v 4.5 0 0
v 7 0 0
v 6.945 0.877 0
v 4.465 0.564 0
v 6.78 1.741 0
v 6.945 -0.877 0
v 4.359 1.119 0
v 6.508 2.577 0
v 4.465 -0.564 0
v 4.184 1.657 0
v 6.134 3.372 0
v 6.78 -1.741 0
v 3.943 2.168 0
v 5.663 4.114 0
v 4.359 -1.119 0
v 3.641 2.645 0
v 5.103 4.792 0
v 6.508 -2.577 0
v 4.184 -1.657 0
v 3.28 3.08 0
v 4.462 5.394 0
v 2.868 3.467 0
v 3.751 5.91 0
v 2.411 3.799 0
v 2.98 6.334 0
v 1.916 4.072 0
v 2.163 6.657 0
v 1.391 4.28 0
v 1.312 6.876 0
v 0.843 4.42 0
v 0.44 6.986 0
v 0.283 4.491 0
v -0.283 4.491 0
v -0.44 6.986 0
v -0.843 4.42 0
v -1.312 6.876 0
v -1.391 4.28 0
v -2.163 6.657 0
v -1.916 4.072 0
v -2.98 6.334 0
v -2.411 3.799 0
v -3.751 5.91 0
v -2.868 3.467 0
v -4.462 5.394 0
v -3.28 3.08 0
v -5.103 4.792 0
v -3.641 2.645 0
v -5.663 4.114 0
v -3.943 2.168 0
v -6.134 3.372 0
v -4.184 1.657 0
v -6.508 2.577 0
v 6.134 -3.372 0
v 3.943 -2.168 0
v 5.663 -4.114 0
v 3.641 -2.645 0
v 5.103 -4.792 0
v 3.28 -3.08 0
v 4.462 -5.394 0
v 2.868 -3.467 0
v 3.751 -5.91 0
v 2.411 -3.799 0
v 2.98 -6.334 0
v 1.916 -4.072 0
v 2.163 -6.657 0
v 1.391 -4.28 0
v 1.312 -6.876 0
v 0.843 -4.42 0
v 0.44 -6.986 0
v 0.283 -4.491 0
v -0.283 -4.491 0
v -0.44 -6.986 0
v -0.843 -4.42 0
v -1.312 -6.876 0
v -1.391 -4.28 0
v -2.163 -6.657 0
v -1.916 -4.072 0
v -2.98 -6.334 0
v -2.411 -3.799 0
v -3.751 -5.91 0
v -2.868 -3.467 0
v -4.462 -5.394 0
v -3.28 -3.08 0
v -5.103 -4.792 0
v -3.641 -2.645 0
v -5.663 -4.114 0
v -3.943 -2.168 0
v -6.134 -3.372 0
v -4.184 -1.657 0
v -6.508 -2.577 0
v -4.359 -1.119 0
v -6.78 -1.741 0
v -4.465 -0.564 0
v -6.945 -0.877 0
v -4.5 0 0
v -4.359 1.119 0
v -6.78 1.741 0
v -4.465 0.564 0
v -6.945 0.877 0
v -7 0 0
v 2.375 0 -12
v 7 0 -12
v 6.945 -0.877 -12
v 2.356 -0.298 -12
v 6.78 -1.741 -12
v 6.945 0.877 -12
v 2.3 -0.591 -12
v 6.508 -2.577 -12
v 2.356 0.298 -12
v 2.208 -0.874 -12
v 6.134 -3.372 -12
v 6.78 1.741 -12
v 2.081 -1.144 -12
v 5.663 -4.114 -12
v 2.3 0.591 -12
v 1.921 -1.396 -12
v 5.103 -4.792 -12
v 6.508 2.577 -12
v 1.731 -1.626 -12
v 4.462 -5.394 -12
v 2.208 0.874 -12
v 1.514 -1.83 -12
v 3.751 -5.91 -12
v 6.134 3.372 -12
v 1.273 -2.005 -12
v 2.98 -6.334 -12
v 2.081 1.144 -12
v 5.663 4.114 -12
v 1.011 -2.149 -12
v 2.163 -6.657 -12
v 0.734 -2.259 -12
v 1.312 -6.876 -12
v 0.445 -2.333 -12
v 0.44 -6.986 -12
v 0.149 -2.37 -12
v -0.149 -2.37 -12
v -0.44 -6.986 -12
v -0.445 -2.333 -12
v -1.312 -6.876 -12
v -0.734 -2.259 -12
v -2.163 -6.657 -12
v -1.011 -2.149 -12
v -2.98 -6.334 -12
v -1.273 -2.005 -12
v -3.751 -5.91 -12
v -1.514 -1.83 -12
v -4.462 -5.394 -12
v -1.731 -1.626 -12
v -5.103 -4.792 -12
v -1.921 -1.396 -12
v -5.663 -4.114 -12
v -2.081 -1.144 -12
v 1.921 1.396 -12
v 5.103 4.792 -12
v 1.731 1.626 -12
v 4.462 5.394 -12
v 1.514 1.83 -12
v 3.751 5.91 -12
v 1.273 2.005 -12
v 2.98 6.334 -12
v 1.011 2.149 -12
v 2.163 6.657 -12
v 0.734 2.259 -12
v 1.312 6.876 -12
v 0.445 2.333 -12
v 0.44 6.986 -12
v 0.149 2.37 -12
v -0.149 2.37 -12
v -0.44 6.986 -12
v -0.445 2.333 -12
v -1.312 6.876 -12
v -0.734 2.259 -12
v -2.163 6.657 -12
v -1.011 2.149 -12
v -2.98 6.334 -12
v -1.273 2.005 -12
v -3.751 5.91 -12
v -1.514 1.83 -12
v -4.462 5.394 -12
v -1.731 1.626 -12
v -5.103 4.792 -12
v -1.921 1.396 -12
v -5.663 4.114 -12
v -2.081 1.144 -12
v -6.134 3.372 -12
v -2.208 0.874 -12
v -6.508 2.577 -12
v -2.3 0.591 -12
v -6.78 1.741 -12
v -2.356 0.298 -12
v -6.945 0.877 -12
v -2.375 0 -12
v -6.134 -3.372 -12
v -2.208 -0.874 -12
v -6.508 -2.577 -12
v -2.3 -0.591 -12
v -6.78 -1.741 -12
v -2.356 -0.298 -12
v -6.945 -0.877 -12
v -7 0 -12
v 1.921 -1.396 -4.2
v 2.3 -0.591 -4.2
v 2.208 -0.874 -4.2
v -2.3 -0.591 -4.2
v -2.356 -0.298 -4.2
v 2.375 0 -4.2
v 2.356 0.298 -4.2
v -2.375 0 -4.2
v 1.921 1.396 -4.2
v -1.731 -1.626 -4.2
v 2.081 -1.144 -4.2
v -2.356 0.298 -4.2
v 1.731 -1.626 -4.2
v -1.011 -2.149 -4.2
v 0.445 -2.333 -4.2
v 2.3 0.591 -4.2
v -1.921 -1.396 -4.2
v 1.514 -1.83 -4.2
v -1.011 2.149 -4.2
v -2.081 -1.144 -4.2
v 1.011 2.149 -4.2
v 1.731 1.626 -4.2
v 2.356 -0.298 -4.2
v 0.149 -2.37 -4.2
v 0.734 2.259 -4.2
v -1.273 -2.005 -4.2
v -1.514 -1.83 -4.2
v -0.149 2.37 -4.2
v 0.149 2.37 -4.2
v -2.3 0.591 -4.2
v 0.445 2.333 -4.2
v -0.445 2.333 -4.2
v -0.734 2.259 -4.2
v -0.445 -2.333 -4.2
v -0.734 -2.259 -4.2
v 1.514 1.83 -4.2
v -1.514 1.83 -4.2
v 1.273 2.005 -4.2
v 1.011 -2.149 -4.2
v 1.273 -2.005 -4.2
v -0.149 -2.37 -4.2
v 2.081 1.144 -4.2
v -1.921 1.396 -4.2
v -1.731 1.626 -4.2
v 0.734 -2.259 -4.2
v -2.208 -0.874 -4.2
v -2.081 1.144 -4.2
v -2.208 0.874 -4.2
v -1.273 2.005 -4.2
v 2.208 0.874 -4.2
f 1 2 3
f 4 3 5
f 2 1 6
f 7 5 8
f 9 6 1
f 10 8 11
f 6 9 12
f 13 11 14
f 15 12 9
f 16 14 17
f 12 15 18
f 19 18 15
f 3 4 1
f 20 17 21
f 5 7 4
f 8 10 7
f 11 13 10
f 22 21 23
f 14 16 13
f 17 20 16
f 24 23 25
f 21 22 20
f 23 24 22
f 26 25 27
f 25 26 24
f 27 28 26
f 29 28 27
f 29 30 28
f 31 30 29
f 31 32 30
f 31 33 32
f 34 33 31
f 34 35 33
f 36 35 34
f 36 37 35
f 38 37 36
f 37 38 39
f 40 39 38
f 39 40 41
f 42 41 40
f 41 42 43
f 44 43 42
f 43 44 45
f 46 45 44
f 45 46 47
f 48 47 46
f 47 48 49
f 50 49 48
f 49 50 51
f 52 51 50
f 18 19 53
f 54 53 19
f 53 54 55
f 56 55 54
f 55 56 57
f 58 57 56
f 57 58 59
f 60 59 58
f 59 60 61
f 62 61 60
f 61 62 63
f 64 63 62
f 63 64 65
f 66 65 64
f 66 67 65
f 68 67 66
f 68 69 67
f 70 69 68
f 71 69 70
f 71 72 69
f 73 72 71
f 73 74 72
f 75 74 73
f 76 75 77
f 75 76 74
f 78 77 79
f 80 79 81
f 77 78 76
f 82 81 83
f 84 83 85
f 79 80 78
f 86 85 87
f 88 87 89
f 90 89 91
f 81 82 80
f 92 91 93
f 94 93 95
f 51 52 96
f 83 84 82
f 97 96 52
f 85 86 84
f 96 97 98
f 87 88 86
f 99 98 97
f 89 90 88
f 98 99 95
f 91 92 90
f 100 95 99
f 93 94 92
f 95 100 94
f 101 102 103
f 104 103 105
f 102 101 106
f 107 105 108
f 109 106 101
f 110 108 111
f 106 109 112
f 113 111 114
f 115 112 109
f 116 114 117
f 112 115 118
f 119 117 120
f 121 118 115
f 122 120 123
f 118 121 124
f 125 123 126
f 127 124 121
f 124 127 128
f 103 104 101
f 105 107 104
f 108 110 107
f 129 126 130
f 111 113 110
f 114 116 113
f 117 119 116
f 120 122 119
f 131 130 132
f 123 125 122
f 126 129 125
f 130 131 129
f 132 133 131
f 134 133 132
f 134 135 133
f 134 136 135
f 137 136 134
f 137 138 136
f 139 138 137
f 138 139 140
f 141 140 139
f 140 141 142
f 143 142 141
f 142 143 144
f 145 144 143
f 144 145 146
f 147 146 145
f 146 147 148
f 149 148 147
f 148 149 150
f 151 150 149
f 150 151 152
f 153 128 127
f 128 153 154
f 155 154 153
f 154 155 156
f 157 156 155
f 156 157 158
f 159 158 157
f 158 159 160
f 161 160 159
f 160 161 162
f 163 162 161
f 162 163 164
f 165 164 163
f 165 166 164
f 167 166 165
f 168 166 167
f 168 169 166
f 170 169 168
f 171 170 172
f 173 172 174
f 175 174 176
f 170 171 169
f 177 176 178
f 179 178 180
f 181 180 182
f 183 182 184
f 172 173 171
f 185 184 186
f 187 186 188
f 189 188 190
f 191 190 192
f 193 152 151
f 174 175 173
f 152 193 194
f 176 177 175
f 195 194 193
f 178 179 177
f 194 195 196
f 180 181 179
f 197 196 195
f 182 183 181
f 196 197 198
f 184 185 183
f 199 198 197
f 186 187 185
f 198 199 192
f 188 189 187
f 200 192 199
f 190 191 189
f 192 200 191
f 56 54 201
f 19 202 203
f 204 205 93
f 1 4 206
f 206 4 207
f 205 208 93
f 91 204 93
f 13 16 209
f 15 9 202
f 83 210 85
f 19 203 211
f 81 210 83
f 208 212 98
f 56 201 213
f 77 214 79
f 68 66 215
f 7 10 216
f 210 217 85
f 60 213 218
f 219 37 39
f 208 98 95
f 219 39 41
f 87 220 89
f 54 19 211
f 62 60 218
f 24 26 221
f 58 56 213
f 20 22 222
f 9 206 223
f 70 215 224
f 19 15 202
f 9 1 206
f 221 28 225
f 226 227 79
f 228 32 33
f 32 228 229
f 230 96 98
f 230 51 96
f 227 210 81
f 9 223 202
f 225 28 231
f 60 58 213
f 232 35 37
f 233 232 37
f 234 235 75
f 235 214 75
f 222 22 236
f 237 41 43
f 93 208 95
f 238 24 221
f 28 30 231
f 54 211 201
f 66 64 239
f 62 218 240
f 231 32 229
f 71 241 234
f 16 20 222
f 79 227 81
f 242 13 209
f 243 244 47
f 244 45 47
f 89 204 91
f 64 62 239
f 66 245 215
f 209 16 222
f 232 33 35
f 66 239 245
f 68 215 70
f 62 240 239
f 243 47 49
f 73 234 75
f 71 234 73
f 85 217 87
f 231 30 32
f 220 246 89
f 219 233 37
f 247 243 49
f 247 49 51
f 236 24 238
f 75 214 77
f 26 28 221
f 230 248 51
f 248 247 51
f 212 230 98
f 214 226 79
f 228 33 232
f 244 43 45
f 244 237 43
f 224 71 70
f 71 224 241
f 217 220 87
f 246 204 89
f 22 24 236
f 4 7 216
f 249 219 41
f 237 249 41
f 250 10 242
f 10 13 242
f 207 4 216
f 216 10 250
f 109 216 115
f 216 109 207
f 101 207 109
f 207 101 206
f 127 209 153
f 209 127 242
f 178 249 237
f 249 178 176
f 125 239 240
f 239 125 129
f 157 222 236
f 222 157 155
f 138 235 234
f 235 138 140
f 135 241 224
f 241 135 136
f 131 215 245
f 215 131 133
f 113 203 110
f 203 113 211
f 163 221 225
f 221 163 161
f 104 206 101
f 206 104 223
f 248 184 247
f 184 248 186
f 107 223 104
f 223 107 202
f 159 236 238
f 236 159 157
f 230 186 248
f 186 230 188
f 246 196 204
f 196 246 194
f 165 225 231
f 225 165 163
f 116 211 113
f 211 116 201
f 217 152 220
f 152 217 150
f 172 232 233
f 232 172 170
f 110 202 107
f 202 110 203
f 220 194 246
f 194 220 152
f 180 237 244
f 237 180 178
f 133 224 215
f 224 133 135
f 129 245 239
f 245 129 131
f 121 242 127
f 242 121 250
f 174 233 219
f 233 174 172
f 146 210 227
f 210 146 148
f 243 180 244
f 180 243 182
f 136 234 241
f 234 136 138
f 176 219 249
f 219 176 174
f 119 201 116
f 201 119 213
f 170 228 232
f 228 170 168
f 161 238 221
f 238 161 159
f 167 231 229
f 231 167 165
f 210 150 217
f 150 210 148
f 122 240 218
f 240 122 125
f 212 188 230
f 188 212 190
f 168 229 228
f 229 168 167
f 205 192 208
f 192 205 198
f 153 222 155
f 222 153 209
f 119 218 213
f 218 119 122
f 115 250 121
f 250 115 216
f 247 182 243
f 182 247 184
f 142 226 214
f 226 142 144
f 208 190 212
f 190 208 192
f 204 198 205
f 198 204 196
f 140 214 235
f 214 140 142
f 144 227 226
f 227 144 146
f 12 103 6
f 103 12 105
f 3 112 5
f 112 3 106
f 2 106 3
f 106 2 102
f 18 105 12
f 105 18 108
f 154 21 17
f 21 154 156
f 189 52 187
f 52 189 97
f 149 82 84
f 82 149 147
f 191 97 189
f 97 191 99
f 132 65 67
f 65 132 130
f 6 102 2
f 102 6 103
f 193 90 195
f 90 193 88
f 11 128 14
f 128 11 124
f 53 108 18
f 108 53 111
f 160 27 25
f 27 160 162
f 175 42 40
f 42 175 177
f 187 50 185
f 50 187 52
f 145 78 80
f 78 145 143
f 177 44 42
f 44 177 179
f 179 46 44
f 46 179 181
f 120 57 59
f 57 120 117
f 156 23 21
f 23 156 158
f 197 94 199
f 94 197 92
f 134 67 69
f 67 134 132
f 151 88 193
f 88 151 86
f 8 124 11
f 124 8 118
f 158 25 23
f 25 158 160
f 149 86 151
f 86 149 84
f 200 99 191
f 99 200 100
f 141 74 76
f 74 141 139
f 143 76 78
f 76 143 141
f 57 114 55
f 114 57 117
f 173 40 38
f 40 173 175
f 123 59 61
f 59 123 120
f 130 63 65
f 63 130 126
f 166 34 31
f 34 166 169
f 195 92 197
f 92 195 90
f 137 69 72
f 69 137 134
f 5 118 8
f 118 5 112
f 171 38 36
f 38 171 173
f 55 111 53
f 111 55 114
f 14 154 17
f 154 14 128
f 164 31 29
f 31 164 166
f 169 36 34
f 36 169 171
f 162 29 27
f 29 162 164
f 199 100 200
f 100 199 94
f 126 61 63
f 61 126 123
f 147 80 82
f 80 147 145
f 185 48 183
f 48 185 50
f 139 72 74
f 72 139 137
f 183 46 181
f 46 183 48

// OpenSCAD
$fn = 50;


difference() {
	union() {
		translate(v = [0, 0, -12.0000000000]) {
			cylinder(h = 12, r = 7.0000000000);
		}
		cylinder(h = 0, r = 16.0000000000);
	}
	union() {
		translate(v = [0, 0, 0]) {
			rotate(a = [0, 0, 0]) {
				difference() {
					union() {
						#translate(v = [0, 0, -12.0000000000]) {
							cylinder(h = 12, r = 2.2500000000);
						}
						#translate(v = [0, 0, -4.2000000000]) {
							cylinder(h = 4.2000000000, r1 = 2.3750000000, r2 = 4.5000000000);
						}
						#translate(v = [0, 0, -12.0000000000]) {
							cylinder(h = 12, r = 2.3750000000);
						}
						#translate(v = [0, 0, -12.0000000000]) {
							cylinder(h = 12, r = 2.2500000000);
						}
					}
					union();
				}
			}
		}
	}
}
